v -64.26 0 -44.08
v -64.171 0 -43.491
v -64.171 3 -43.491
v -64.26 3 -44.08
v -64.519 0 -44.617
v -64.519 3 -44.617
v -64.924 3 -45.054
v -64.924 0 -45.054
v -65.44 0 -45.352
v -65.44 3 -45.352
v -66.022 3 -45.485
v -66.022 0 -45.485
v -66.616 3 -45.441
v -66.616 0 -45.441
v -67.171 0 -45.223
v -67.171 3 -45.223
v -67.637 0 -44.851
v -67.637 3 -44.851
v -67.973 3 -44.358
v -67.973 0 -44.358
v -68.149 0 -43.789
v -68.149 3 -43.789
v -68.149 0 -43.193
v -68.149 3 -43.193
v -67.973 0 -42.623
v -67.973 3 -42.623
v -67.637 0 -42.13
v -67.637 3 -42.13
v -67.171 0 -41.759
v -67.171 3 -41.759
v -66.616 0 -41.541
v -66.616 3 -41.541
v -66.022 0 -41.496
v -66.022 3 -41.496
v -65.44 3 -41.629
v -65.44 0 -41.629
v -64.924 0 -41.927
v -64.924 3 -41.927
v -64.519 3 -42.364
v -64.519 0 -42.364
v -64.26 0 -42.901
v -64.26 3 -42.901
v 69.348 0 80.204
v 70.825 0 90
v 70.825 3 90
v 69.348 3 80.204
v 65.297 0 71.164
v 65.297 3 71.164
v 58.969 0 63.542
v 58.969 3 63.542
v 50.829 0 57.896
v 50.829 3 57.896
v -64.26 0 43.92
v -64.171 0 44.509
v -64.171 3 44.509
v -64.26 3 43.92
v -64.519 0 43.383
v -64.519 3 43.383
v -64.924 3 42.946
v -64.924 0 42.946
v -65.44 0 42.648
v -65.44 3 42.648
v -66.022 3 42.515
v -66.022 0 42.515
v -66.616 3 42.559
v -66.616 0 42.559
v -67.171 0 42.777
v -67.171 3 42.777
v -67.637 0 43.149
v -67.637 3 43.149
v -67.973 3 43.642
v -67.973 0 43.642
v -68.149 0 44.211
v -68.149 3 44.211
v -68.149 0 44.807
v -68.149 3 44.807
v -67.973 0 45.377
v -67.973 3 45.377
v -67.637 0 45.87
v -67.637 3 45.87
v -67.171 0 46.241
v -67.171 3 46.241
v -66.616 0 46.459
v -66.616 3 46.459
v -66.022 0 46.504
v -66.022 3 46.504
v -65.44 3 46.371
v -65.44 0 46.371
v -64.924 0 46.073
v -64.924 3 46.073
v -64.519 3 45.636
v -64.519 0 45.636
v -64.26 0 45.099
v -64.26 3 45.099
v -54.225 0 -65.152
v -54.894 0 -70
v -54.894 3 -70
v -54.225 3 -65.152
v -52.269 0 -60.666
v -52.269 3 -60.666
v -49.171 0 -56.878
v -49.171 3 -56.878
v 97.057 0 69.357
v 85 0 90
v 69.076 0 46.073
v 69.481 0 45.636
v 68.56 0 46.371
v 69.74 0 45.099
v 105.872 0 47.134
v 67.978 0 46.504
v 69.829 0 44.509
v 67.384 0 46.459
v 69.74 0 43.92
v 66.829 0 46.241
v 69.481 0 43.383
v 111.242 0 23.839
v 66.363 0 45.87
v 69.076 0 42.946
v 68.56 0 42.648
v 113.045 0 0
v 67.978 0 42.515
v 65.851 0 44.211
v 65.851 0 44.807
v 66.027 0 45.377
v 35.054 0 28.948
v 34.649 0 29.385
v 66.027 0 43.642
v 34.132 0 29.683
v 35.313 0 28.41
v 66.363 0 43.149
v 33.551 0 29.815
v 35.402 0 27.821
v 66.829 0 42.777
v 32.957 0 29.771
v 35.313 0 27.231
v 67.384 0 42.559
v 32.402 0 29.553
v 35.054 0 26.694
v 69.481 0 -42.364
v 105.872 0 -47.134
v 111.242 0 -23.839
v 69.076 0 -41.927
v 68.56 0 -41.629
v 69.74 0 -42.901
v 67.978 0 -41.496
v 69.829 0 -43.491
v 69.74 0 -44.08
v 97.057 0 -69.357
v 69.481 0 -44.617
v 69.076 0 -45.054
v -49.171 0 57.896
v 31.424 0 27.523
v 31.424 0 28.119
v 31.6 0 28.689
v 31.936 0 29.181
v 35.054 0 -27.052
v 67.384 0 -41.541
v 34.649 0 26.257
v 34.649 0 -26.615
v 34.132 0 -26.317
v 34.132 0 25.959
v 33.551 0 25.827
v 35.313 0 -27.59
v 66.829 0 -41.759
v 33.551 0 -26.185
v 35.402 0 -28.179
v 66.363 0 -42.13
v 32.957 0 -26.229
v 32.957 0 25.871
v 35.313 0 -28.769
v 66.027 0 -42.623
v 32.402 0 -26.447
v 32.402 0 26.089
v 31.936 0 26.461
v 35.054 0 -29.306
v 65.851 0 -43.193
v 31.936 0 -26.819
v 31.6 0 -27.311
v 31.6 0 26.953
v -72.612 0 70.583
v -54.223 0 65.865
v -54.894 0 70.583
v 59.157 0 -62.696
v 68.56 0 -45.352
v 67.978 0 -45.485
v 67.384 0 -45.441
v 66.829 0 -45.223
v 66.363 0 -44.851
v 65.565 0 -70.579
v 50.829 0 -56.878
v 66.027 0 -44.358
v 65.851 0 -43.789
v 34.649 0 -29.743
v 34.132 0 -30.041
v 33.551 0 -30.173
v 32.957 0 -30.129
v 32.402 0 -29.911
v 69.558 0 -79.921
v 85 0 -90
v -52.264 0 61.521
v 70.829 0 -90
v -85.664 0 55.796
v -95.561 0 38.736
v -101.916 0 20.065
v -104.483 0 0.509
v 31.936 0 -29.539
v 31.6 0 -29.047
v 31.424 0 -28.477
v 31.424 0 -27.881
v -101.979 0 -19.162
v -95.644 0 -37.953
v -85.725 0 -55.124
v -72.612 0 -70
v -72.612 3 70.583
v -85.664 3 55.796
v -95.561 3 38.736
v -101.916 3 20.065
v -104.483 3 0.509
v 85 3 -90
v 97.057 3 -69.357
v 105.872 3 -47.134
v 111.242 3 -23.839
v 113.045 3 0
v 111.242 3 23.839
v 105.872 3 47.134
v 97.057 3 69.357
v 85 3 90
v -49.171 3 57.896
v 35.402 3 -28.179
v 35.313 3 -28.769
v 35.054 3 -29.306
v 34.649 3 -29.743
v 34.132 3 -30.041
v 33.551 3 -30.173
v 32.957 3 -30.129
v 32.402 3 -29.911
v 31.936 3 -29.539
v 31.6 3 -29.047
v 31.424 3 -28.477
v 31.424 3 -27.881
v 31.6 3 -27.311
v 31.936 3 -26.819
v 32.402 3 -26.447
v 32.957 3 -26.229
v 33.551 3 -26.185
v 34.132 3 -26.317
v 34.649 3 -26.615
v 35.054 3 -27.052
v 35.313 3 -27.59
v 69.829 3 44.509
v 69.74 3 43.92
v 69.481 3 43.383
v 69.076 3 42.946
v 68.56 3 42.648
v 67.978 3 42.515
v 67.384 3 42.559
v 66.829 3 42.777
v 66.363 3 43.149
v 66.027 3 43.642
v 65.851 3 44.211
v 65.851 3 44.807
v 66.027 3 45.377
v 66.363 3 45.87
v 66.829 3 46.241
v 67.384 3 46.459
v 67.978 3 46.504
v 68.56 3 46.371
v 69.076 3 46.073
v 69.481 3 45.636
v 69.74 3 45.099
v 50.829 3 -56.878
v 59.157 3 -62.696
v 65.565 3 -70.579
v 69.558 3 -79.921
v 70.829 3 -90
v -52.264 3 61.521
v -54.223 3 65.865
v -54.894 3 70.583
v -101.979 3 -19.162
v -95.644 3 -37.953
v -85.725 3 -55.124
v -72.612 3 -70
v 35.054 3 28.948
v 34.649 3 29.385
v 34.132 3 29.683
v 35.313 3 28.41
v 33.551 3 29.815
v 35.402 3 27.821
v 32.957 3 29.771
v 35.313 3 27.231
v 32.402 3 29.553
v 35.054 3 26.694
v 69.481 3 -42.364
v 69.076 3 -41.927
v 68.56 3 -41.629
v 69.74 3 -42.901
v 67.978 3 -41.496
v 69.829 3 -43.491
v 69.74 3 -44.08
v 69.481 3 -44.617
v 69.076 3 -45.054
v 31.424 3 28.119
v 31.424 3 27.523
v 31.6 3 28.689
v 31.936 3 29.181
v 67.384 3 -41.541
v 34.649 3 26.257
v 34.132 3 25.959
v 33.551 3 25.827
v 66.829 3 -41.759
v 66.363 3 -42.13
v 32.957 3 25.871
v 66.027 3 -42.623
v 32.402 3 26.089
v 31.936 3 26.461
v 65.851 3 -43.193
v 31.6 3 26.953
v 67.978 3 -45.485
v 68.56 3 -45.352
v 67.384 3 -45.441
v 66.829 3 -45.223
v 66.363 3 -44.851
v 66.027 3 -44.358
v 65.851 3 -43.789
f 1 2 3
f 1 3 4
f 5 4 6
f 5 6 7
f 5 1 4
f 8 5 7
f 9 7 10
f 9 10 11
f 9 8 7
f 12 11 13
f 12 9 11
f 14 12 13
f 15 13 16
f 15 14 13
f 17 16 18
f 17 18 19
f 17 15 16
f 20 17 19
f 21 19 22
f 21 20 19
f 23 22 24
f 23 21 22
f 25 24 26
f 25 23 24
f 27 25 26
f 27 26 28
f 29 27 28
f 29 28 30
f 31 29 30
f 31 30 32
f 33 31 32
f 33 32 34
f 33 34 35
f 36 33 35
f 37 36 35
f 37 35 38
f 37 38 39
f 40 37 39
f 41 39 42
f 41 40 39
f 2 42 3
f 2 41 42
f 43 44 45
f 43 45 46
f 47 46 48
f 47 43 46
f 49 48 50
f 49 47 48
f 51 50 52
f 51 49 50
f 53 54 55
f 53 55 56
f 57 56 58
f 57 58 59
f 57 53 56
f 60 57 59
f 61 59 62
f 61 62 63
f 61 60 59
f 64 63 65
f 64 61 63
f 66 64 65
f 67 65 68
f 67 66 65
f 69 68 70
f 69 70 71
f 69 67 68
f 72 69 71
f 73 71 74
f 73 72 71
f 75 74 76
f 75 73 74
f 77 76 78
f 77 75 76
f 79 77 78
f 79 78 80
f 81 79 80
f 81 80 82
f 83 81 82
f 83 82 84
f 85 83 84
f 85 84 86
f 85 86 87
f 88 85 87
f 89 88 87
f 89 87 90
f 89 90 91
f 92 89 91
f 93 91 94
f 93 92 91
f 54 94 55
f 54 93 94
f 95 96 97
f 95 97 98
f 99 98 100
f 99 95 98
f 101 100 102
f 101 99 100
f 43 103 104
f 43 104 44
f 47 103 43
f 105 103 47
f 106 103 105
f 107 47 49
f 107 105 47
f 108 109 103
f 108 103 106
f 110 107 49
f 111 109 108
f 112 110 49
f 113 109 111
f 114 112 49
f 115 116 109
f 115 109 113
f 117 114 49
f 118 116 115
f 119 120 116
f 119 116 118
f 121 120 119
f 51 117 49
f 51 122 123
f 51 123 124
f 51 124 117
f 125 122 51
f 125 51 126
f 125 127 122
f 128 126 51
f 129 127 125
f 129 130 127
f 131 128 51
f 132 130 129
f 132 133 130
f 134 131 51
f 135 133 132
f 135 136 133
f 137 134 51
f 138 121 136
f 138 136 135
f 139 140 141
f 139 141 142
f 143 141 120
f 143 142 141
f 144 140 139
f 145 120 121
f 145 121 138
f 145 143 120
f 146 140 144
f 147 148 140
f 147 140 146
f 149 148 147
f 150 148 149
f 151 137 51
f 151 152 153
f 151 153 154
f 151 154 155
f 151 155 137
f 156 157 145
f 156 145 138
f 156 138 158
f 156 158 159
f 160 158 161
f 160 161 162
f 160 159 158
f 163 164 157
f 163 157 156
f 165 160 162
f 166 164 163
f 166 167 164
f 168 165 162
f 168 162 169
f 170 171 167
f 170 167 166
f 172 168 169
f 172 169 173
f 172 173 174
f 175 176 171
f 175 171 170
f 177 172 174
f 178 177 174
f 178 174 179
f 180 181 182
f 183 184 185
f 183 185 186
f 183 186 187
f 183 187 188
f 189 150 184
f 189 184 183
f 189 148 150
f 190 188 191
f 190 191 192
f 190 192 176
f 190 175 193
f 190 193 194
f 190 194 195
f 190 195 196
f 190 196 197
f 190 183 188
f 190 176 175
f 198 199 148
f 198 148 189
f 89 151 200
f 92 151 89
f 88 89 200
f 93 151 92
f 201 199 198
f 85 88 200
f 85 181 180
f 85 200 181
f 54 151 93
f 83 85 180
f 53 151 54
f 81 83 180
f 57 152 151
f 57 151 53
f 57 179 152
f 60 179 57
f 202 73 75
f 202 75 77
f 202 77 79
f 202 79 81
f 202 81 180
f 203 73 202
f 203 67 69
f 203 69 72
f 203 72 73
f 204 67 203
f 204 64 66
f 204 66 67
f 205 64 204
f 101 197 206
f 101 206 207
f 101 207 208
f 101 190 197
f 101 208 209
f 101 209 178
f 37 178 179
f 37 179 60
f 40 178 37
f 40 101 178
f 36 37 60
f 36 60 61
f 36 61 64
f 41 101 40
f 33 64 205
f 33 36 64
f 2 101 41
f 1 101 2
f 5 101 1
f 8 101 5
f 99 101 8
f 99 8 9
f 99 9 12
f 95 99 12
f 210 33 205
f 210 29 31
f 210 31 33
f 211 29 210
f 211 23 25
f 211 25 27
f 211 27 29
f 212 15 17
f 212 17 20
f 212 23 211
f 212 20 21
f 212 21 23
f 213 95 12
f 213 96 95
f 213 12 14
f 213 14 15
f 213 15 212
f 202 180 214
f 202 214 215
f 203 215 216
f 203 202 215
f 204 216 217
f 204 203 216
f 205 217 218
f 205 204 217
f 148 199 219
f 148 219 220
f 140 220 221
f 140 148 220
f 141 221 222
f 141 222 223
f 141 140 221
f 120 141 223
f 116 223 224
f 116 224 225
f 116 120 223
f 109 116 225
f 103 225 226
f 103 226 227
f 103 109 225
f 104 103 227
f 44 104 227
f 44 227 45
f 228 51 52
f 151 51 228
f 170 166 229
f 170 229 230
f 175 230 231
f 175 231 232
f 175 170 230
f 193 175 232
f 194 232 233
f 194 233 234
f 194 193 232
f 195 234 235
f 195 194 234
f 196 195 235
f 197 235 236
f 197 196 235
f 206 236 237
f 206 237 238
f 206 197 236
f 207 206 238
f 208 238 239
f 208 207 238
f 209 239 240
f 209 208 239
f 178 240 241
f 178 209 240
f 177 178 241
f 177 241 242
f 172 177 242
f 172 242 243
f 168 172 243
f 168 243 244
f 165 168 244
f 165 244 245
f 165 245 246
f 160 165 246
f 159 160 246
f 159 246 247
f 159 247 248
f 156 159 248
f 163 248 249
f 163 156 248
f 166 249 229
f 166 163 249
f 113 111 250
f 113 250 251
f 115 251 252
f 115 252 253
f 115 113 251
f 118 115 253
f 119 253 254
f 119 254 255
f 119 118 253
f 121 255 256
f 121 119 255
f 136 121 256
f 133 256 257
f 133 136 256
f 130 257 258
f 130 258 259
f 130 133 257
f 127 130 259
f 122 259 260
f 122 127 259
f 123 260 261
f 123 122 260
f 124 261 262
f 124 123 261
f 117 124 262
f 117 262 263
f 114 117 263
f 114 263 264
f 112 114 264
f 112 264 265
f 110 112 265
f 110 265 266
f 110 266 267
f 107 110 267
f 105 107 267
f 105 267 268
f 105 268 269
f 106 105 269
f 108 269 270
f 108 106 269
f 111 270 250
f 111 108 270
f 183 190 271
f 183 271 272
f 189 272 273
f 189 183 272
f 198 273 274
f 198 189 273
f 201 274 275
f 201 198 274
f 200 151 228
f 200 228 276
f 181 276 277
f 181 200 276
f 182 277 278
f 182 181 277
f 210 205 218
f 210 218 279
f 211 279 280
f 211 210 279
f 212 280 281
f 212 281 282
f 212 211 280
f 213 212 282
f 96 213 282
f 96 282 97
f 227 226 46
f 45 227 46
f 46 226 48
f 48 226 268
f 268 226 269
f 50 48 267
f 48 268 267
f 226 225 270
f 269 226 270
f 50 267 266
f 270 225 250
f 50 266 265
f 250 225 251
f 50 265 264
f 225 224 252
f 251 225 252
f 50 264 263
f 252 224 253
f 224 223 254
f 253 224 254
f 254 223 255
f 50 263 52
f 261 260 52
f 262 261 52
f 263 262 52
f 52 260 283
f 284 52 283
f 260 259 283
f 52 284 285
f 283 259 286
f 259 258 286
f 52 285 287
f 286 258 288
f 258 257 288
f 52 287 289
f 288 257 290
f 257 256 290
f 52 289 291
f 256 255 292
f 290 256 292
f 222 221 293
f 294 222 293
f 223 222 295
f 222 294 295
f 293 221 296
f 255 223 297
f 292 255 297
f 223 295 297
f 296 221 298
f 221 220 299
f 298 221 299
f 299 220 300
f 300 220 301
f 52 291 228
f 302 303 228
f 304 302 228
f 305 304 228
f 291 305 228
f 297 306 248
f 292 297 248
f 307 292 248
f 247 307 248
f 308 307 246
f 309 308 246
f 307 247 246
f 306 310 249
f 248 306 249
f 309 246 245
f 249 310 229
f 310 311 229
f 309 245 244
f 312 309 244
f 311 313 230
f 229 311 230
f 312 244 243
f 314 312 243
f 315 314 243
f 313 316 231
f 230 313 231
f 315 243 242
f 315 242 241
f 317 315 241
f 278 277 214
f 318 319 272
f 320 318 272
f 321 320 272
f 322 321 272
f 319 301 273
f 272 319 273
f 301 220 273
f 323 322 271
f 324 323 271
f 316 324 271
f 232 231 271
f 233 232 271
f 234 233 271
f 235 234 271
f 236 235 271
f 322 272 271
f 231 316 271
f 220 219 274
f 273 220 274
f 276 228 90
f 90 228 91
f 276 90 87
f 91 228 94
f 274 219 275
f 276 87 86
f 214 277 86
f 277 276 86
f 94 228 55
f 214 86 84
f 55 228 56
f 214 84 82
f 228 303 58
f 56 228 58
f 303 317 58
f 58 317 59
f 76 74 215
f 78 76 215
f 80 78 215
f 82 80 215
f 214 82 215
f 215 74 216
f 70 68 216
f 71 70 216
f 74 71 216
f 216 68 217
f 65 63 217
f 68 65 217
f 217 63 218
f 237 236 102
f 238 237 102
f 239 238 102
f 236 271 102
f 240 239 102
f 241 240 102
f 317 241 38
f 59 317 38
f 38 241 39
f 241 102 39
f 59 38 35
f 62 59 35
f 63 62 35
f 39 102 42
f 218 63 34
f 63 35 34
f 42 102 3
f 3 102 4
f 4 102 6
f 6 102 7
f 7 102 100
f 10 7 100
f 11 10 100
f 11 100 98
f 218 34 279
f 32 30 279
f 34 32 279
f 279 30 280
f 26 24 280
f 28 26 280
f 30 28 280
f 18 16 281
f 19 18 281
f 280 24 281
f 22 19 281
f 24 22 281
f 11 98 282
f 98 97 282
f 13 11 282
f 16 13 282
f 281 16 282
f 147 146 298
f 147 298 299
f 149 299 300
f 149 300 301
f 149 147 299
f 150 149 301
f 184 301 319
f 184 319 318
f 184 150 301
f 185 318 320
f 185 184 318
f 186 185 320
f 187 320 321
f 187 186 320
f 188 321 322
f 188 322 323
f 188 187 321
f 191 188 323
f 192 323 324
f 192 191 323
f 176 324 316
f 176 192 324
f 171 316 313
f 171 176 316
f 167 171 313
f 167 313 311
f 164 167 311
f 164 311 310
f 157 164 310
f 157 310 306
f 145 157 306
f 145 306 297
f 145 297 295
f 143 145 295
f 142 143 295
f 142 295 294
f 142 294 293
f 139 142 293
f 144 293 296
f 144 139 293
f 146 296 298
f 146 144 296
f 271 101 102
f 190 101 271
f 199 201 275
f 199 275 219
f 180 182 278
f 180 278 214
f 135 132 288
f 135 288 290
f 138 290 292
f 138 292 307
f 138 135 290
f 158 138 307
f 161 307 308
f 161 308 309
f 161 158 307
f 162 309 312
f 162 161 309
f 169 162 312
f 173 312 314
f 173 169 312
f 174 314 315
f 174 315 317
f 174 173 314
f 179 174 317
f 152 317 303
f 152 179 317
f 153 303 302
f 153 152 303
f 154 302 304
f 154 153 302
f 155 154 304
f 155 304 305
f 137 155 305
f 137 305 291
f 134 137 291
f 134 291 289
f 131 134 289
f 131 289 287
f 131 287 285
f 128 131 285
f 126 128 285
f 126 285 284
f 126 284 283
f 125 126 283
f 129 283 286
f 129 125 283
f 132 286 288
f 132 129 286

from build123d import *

# Parameters (mm, degrees)
SKETCH3_R           = 2
BOSS_EXTRUDE3_DEPTH = 3


with BuildPart() as part:
    # Sketch3 → Boss-Extrude3 (new body)
    with BuildSketch(Plane(origin=(0, 0, 0), x_dir=(1, 0, 0), z_dir=(0, 1, 0))):
        with BuildLine():
            Line((-49.171013104, 56.877731278), (50.828986896, 56.877731278))
            ThreePointArc((50.828986896, 56.877731278), (65.565194963, 70.579032512), (70.828986896, 90))
            Line((70.828986896, 90), (85, 90))
            ThreePointArc((85, 90), (113.045378517, 0), (85, -90))
            Line((85, -90), (70.825442188, -90))
            ThreePointArc((70.825442188, -90), (65.296898803, -71.164130385), (50.828986896, -57.896338511))
            Line((50.828986896, -57.896338511), (-49.171013104, -57.896338511))
            ThreePointArc((-49.171013104, -57.896338511), (-53.39689903, -63.623937963), (-54.893799534, -70.582586985))
            Line((-54.893799534, -70.582586985), (-72.612335341, -70.582586985))
            ThreePointArc((-72.612335341, -70.582586985), (-95.56056104, -38.735568001), (-104.48280247, -0.509303616))
            ThreePointArc((-104.48280247, -0.509303616), (-95.643665217, 37.952810082), (-72.612335341, 70))
            Line((-72.612335341, 70), (-54.893799534, 70))
            ThreePointArc((-54.893799534, 70), (-53.400865269, 62.84206348), (-49.171013104, 56.877731278))
        make_face()
        with Locations((33.401757754, -27.820969354)):
            Circle(SKETCH3_R, mode=Mode.SUBTRACT)
        with Locations((33.401757754, 28.179030646)):
            Circle(SKETCH3_R, mode=Mode.SUBTRACT)
        with Locations((-66.171013104, 43.490696384)):
            Circle(SKETCH3_R, mode=Mode.SUBTRACT)
        with Locations((67.828986896, 43.490696384)):
            Circle(SKETCH3_R, mode=Mode.SUBTRACT)
        with Locations((67.828986896, -44.509303616)):
            Circle(SKETCH3_R, mode=Mode.SUBTRACT)
        with Locations((-66.171013104, -44.509303616)):
            Circle(SKETCH3_R, mode=Mode.SUBTRACT)
    extrude(amount=BOSS_EXTRUDE3_DEPTH)


solid = part.part
